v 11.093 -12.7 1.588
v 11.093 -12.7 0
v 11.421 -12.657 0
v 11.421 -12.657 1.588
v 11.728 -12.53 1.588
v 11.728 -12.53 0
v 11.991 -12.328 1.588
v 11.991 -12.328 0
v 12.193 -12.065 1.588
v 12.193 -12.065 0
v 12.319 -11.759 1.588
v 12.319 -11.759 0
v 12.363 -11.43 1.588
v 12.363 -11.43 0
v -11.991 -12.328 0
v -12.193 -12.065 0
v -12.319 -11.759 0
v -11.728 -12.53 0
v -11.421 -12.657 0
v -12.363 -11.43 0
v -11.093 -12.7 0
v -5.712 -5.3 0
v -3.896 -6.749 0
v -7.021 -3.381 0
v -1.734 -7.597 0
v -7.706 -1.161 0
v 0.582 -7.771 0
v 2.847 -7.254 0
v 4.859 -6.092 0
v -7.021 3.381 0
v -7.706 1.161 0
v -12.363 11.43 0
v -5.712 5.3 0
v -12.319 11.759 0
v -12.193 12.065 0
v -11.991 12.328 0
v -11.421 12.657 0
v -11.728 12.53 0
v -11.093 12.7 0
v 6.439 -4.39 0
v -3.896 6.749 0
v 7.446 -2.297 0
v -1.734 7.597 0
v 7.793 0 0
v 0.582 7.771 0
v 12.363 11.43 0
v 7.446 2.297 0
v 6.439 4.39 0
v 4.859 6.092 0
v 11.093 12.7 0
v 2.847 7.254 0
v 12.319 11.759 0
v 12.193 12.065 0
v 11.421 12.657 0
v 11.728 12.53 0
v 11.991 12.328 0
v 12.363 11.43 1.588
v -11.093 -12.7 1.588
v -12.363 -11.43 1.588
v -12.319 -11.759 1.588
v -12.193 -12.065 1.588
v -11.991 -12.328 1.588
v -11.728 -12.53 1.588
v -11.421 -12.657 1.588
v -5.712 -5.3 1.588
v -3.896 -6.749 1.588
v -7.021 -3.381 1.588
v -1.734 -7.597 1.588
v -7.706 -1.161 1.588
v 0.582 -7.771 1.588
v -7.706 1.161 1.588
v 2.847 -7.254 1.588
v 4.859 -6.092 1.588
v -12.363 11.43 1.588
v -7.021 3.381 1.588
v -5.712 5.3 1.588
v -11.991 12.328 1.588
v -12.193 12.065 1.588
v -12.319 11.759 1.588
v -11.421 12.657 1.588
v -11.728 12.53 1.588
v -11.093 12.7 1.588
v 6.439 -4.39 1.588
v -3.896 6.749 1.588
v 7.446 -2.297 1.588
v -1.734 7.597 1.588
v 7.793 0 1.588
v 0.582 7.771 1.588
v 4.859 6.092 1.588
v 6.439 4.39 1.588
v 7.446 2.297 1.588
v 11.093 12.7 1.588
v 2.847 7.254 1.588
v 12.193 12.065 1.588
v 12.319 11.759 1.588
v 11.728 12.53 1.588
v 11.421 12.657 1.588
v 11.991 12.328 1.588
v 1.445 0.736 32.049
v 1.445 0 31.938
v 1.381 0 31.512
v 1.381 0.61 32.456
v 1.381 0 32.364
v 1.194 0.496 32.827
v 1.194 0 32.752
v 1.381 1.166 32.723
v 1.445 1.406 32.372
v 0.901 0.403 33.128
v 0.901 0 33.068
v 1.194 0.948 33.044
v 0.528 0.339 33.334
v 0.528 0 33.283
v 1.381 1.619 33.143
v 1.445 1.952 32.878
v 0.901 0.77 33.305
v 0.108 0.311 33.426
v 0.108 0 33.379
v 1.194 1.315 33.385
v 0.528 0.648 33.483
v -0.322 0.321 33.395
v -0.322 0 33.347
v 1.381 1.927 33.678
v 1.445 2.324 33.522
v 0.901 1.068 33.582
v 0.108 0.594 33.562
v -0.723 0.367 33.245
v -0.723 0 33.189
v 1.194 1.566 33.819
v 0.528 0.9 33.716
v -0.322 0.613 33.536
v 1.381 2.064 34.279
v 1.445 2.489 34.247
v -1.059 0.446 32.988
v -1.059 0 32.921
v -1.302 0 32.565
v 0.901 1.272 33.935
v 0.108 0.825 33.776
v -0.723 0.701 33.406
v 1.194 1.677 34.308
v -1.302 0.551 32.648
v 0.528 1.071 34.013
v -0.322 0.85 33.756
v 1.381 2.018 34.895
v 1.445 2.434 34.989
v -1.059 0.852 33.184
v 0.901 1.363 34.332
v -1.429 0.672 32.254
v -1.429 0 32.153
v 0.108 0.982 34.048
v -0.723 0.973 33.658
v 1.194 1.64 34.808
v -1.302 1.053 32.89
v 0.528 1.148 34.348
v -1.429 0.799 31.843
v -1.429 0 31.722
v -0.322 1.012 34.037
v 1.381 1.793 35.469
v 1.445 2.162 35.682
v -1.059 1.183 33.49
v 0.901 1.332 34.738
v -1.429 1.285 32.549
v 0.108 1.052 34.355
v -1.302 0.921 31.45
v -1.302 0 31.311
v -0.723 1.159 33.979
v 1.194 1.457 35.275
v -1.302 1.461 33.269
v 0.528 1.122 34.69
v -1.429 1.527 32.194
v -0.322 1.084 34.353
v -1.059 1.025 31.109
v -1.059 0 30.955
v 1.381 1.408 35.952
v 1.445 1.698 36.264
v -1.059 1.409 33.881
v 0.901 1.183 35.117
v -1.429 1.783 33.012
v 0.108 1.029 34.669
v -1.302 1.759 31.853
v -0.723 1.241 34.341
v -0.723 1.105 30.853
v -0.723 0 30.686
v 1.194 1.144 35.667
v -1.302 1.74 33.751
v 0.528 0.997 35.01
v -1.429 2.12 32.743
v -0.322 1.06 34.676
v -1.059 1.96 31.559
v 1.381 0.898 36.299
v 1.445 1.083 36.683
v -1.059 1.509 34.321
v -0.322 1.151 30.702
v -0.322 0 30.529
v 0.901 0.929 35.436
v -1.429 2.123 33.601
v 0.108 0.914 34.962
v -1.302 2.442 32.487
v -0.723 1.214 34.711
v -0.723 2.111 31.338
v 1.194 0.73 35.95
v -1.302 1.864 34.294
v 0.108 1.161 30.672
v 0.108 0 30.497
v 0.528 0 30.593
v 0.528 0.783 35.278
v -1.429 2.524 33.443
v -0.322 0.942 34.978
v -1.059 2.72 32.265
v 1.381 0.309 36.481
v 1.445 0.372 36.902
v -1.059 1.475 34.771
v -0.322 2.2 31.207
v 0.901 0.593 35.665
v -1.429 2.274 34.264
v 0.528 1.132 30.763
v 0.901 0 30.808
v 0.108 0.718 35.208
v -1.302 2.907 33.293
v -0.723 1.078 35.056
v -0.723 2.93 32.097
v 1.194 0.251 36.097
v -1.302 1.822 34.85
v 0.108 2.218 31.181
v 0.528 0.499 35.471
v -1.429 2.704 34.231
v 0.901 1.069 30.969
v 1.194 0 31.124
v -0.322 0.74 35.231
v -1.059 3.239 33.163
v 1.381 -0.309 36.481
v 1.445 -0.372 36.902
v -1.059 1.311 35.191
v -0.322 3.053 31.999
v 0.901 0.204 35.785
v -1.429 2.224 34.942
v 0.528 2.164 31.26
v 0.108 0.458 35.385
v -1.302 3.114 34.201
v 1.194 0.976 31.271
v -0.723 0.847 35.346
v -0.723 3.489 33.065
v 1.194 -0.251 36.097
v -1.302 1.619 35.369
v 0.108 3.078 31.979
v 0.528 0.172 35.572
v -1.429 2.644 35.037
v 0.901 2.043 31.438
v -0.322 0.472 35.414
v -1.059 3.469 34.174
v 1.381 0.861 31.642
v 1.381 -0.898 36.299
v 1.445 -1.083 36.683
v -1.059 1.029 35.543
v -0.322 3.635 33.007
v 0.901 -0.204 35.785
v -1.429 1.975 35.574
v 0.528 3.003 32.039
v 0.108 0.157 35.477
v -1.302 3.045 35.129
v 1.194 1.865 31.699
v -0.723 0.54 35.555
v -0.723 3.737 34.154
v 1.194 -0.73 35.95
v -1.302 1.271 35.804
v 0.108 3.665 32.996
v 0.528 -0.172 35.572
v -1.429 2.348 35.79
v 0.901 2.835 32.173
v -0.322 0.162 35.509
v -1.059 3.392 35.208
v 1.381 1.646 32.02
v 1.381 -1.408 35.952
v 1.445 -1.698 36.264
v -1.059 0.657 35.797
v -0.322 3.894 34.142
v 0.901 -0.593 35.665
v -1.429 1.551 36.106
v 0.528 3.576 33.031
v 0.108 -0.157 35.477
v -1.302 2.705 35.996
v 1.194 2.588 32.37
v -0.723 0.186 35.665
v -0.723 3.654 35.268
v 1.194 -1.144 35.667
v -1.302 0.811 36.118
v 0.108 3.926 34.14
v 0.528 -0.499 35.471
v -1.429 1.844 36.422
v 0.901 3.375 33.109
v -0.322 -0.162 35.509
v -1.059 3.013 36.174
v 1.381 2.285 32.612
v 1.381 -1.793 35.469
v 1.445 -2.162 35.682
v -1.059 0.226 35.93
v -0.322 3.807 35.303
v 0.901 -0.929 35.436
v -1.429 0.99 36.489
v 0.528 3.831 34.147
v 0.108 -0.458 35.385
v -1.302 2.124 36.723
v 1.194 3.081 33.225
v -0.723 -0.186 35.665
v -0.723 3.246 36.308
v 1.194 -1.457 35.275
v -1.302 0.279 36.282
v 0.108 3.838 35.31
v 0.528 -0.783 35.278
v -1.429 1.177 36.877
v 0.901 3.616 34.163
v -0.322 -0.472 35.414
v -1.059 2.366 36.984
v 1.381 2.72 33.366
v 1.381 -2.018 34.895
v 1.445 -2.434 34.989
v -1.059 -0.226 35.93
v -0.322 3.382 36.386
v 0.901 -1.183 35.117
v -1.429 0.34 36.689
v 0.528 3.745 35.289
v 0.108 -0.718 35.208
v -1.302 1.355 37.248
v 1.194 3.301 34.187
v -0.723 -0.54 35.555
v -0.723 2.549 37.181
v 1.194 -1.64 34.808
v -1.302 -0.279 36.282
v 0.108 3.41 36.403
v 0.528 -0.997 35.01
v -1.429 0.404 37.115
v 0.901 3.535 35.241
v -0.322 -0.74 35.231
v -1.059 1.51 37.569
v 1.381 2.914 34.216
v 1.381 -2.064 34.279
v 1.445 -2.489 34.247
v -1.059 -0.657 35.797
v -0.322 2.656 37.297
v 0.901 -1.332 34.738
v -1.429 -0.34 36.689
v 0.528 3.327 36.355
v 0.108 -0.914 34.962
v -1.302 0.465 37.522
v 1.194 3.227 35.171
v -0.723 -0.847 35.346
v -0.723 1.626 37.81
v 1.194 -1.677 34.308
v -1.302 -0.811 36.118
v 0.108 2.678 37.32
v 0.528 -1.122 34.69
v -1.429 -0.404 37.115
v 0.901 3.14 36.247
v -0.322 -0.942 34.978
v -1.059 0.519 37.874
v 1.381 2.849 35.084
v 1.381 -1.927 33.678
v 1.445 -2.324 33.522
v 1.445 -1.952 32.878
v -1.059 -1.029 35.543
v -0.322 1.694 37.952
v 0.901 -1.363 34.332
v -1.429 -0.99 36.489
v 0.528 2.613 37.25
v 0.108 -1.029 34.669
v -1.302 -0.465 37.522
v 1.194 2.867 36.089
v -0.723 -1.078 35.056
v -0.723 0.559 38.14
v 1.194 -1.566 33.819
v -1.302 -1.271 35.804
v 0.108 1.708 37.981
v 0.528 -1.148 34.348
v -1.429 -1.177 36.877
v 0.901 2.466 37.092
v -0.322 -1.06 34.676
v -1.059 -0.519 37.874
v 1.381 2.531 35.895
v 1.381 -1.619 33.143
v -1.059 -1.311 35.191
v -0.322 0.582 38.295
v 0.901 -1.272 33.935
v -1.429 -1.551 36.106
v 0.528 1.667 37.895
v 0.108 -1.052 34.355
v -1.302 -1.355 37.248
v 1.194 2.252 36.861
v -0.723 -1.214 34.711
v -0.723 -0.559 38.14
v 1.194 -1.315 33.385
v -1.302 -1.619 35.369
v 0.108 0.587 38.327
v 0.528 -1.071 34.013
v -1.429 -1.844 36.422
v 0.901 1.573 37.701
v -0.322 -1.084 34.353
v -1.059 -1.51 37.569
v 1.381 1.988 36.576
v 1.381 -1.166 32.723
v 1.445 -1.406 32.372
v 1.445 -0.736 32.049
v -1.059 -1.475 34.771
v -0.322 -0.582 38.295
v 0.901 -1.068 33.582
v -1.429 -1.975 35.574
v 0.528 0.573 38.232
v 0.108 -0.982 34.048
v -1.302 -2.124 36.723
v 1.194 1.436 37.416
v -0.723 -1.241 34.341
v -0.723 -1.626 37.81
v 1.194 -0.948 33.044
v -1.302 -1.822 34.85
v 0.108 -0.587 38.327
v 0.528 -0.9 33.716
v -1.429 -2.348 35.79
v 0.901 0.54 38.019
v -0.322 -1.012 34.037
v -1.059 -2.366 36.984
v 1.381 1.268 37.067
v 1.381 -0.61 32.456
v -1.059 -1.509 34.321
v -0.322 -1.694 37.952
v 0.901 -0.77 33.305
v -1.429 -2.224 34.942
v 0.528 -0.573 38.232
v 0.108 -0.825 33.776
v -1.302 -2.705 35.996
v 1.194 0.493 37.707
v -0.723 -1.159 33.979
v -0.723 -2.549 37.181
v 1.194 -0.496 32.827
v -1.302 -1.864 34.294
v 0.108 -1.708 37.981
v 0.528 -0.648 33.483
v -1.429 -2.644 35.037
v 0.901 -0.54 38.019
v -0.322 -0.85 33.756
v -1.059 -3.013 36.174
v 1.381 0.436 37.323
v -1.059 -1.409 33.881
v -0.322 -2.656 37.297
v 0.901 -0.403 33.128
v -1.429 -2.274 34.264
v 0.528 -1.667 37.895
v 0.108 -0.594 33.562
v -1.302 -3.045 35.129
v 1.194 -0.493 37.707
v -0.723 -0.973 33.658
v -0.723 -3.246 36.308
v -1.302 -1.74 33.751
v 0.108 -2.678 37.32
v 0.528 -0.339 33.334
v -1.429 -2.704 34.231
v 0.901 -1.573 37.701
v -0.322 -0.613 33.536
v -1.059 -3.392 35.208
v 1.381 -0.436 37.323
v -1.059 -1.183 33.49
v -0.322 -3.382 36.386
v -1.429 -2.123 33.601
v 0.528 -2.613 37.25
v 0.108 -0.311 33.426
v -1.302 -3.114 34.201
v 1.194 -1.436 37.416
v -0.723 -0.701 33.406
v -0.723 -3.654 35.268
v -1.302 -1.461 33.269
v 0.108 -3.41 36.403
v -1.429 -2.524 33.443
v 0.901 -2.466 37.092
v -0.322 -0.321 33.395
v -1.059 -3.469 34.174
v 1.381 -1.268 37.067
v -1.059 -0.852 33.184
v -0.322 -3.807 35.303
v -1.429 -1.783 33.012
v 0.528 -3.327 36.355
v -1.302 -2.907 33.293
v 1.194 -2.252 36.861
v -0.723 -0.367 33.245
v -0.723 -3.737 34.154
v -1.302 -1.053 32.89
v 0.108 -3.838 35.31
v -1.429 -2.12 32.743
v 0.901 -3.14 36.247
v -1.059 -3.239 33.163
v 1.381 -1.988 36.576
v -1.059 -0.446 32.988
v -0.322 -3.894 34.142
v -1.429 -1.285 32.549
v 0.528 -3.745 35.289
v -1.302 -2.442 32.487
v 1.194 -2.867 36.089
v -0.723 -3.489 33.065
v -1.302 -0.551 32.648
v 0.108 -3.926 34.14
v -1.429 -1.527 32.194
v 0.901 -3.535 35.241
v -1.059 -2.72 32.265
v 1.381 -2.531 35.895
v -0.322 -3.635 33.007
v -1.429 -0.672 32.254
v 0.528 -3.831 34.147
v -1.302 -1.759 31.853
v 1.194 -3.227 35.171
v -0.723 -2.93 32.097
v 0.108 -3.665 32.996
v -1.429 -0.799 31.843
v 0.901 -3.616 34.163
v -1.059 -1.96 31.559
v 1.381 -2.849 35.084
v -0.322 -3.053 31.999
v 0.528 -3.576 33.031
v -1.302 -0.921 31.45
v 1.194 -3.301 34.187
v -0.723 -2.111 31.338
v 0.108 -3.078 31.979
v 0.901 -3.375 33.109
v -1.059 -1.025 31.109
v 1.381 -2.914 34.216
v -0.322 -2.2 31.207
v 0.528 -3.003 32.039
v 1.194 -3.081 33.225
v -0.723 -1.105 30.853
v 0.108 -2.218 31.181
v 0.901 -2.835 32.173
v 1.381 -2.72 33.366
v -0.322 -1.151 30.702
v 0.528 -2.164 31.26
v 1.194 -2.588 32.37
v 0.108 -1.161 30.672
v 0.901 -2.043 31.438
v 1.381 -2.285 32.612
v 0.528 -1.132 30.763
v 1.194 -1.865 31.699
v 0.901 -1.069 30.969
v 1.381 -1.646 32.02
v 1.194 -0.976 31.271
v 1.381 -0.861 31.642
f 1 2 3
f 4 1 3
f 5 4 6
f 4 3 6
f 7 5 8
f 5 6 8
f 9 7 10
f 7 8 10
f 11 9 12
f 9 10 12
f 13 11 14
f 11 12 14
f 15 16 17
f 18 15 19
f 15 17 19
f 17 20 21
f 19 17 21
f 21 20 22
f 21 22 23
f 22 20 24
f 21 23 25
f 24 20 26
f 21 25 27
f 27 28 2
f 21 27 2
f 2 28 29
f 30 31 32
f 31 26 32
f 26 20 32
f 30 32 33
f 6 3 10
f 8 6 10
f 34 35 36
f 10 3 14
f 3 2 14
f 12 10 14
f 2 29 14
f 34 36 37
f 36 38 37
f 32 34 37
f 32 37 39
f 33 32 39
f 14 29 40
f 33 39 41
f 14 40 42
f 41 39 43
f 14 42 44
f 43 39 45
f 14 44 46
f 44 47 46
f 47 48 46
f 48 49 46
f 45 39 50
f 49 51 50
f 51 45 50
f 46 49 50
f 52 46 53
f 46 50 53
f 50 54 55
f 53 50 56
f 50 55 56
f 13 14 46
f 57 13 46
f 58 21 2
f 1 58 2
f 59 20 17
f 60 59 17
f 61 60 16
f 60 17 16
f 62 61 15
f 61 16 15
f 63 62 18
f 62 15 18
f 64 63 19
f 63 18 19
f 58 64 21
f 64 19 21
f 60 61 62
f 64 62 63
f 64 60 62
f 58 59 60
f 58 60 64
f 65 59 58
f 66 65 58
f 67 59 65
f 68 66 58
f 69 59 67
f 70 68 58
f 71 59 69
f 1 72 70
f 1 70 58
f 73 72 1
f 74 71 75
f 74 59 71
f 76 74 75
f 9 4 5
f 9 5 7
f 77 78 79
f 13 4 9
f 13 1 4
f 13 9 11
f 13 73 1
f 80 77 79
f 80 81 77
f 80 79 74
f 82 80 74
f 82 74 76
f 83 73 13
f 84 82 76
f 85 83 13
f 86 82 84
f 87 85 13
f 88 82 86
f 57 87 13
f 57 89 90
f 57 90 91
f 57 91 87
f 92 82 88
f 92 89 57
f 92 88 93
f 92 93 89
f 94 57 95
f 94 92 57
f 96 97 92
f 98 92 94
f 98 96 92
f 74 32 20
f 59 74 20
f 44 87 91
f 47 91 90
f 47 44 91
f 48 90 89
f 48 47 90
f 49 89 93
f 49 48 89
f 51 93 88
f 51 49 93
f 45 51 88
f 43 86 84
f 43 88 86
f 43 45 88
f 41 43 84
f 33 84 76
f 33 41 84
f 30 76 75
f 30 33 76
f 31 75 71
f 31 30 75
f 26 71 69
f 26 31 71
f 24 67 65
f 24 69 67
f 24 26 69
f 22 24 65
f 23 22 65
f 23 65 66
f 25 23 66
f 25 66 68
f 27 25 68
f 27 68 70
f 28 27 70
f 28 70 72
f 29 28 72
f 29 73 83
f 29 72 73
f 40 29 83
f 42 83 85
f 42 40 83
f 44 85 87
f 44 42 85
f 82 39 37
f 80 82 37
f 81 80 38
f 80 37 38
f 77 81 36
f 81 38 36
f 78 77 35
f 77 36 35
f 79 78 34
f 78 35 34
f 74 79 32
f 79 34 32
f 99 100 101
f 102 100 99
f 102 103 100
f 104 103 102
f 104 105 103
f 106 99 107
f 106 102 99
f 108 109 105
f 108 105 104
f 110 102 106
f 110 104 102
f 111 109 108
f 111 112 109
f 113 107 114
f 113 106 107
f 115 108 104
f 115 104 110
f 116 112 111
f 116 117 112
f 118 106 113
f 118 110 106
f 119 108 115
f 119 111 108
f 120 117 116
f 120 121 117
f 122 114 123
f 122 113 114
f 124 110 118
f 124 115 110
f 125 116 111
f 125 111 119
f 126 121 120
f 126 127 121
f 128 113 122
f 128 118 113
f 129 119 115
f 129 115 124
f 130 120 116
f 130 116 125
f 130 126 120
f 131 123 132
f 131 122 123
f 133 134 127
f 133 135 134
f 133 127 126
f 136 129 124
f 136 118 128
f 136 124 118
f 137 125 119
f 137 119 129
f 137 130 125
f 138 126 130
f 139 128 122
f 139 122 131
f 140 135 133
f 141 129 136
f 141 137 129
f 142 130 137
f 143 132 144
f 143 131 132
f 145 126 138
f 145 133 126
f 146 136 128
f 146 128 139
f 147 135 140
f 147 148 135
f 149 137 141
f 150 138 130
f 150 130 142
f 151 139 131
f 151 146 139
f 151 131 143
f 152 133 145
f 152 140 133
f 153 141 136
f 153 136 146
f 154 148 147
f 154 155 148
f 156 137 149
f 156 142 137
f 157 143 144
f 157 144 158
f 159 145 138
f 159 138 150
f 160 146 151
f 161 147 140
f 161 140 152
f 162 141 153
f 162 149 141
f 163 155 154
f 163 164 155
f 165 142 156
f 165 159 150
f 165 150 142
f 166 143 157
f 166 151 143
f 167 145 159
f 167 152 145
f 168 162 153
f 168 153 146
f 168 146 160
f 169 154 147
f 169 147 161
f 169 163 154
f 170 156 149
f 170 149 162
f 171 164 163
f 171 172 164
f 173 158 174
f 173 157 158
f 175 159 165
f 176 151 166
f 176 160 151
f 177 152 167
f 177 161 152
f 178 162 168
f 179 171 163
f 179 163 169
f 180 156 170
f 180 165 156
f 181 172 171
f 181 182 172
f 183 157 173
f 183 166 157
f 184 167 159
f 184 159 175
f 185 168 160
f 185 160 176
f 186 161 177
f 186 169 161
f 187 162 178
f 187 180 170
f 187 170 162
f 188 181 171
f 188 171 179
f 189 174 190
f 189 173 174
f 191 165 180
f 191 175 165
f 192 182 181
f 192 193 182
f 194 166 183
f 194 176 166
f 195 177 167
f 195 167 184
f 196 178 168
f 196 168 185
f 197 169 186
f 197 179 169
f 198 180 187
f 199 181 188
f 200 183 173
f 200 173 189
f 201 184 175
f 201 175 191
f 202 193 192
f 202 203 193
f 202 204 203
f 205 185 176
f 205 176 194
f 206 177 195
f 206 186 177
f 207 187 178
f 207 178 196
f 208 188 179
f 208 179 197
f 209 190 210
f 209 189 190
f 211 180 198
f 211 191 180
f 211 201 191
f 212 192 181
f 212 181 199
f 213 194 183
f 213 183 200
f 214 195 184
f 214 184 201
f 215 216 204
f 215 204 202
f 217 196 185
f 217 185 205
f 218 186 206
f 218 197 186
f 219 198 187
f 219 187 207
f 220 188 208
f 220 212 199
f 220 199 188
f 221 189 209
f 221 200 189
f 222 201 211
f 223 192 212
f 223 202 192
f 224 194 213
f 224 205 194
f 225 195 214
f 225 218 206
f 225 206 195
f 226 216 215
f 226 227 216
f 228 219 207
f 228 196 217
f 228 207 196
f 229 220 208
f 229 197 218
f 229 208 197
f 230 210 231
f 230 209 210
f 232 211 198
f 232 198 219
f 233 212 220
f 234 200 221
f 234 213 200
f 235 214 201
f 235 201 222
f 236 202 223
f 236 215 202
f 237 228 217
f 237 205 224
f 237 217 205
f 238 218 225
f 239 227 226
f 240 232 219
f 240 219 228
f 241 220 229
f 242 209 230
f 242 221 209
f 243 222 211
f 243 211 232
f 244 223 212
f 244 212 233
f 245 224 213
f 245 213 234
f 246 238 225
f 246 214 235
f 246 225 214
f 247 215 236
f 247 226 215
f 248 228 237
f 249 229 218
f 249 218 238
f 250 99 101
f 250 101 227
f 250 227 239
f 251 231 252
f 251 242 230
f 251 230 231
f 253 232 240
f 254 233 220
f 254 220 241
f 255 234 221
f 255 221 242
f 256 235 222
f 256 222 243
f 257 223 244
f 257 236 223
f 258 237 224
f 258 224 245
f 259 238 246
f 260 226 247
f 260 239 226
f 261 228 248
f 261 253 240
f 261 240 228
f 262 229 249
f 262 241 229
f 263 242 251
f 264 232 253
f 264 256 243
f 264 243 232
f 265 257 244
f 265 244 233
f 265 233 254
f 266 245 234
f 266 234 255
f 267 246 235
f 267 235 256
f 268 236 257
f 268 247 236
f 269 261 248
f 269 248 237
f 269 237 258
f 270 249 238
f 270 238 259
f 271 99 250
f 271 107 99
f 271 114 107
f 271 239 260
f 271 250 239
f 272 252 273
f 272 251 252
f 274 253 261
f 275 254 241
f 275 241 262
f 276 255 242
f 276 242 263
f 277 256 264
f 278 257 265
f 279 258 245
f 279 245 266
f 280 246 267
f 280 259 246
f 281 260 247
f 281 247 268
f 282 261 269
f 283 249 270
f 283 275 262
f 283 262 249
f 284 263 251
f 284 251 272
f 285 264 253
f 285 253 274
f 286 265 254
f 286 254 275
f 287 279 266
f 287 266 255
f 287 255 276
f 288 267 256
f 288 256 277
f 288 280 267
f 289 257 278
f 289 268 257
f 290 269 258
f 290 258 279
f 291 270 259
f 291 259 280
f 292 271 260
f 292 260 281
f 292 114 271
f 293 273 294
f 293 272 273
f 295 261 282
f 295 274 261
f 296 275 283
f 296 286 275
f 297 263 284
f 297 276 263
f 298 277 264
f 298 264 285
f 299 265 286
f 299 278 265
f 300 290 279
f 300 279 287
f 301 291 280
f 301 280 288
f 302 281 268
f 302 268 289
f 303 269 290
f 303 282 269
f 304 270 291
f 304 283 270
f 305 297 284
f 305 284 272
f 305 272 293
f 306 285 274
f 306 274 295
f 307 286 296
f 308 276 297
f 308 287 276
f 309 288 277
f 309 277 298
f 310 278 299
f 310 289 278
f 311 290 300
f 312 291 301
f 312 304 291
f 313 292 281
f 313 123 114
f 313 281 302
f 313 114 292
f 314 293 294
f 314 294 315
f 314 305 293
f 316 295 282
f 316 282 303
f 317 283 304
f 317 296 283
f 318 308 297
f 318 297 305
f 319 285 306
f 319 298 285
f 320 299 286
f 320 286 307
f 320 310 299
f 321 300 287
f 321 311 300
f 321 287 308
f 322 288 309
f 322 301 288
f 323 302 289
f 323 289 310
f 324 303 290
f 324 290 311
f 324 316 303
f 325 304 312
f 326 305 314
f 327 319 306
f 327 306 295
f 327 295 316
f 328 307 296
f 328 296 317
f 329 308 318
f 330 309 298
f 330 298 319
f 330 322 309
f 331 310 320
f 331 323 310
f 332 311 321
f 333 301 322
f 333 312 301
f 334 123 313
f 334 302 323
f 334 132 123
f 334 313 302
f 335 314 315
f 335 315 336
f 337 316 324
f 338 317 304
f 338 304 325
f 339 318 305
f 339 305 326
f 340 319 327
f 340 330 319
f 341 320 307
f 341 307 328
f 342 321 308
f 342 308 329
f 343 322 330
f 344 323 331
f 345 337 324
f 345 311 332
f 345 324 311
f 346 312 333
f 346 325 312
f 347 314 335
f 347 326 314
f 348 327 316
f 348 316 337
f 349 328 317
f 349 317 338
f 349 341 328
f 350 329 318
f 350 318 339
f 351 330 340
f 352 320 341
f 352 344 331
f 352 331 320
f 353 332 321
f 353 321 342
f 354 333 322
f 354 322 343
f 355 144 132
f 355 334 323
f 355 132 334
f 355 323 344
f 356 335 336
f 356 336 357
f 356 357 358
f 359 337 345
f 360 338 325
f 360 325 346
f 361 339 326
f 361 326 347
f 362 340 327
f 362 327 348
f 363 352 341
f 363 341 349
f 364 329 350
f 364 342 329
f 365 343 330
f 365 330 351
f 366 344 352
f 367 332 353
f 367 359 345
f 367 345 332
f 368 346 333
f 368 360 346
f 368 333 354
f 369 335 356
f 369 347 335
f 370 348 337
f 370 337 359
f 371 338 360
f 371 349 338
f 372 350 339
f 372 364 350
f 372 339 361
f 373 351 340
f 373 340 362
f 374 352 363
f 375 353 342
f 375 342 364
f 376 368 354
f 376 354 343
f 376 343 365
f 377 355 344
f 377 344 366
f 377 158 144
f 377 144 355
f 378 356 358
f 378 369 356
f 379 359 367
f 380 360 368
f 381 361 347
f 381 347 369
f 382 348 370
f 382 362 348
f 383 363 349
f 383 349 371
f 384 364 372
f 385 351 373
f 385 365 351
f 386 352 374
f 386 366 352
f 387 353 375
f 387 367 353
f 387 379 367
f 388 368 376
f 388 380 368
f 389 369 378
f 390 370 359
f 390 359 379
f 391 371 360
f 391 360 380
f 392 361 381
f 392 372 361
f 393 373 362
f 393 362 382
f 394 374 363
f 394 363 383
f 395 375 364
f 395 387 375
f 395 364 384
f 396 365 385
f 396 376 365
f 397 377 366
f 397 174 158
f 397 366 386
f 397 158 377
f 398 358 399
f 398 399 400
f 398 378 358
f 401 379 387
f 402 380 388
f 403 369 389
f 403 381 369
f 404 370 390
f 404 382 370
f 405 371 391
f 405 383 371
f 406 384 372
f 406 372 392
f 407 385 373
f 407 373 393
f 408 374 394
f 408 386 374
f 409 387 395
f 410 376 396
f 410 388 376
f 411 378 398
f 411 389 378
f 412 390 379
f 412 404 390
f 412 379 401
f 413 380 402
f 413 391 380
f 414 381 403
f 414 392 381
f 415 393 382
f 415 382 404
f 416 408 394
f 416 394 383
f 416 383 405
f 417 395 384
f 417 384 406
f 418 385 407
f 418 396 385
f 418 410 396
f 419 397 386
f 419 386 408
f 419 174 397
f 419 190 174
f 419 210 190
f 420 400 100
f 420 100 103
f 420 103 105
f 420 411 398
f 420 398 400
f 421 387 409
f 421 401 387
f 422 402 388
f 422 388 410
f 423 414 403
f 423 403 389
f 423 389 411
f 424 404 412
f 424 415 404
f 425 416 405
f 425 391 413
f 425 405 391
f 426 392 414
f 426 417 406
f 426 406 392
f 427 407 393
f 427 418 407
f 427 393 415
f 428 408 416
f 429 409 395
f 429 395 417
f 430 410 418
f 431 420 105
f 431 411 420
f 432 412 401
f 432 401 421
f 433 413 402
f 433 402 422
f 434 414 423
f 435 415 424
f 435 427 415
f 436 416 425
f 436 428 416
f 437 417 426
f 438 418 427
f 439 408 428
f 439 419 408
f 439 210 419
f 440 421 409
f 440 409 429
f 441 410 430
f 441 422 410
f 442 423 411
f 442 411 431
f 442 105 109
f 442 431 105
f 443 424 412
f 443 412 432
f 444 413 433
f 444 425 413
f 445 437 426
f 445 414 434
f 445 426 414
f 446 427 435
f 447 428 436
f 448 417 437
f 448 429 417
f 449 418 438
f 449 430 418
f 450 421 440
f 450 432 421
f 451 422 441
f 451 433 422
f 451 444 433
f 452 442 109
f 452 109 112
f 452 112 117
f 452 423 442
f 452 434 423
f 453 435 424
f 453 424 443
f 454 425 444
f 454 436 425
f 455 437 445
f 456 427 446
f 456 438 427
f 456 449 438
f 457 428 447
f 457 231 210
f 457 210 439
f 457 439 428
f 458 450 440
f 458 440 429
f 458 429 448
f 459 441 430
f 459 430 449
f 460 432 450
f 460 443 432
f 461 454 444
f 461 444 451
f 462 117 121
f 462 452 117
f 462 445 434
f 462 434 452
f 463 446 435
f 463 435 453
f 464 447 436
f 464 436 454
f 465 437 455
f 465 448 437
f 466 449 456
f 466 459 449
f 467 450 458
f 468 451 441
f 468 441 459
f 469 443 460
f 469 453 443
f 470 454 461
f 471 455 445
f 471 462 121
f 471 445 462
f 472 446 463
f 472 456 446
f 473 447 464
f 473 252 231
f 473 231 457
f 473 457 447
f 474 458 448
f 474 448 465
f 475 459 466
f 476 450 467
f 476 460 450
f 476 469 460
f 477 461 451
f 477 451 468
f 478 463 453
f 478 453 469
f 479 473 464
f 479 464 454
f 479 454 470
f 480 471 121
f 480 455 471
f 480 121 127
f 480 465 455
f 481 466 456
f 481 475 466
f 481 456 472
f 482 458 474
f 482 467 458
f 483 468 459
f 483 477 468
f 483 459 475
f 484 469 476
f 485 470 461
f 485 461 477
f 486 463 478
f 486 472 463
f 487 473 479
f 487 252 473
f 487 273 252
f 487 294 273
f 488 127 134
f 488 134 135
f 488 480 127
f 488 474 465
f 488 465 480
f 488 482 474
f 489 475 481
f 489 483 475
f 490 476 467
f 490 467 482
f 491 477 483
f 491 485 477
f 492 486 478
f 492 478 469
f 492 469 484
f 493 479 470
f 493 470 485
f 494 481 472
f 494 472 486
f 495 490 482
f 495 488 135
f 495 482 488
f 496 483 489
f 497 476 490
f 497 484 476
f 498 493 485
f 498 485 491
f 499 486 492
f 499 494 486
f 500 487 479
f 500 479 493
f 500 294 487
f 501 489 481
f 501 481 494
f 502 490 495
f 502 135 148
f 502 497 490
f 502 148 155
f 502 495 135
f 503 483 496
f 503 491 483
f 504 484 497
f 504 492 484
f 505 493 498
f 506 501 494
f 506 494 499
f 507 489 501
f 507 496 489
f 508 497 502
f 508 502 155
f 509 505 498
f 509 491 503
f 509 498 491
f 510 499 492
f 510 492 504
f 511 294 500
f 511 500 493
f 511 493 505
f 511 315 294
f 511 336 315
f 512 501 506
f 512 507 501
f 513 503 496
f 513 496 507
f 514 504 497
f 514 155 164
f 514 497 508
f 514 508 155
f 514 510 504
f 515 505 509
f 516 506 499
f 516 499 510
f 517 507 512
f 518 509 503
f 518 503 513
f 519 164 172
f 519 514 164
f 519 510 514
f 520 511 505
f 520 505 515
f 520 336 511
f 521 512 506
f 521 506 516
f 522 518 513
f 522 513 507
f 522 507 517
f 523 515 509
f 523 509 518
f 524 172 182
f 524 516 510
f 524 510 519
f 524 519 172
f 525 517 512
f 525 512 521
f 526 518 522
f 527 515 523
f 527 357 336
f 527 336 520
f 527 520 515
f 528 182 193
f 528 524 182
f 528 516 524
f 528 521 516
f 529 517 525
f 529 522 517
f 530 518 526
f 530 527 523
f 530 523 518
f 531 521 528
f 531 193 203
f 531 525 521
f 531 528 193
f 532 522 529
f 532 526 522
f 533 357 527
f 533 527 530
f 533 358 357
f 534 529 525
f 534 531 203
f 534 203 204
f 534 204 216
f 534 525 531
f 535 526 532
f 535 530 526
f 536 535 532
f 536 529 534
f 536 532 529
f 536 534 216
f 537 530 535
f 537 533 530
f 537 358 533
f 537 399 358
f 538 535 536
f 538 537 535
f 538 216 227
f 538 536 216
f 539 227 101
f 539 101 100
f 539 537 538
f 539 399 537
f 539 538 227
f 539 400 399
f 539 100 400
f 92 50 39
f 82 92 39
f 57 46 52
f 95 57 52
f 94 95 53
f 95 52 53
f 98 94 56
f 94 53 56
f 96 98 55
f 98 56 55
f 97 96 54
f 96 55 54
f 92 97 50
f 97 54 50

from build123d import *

# Parameters (mm, degrees)
F1_DEPTH = 1.5875
F4_R     = 1.445040765
F6_R     = 7.792593953
F7_DEPTH = 1.651


# Not quite as in the source:
# - the program builds the solid bodies; features that only make, move or delete a surface that nothing else refers to are left out


with BuildPart() as f1:
    # F0 (on Top) → F1 (new body)
    with BuildSketch(Plane.XY):
        with BuildLine():
            Line((-11.092720091, -12.7), (11.092720091, -12.7))
            ThreePointArc((11.092720091, -12.7), (11.9907457031, -12.3280256121), (12.362720091, -11.43))
            Line((12.362720091, -11.43), (12.362720091, 11.43))
            ThreePointArc((12.362720091, 11.43), (11.9907457031, 12.3280256121), (11.092720091, 12.7))
            Line((11.092720091, 12.7), (-11.092720091, 12.7))
            ThreePointArc((-11.092720091, 12.7), (-11.9907457031, 12.3280256121), (-12.362720091, 11.43))
            Line((-12.362720091, 11.43), (-12.362720091, -11.43))
            ThreePointArc((-12.362720091, -11.43), (-11.9907457031, -12.3280256121), (-11.092720091, -12.7))
        make_face()
    extrude(amount=F1_DEPTH)

    # F6 (on Top) → F7 (cut)
    with BuildSketch(Plane.XY):
        Circle(F6_R)
    extrude(amount=F7_DEPTH, mode=Mode.SUBTRACT)


with BuildPart() as f5:
    # F4 (on Front) → F5 (revolve)
    with BuildSketch(Plane.XZ):
        with Locations((0, 31.9377668202)):
            Circle(F4_R)
    revolve(axis=Axis((0.2411192982, 0, 34.4339795411), (1, 0, 0)))


solid = Compound([f1.part, f5.part])
